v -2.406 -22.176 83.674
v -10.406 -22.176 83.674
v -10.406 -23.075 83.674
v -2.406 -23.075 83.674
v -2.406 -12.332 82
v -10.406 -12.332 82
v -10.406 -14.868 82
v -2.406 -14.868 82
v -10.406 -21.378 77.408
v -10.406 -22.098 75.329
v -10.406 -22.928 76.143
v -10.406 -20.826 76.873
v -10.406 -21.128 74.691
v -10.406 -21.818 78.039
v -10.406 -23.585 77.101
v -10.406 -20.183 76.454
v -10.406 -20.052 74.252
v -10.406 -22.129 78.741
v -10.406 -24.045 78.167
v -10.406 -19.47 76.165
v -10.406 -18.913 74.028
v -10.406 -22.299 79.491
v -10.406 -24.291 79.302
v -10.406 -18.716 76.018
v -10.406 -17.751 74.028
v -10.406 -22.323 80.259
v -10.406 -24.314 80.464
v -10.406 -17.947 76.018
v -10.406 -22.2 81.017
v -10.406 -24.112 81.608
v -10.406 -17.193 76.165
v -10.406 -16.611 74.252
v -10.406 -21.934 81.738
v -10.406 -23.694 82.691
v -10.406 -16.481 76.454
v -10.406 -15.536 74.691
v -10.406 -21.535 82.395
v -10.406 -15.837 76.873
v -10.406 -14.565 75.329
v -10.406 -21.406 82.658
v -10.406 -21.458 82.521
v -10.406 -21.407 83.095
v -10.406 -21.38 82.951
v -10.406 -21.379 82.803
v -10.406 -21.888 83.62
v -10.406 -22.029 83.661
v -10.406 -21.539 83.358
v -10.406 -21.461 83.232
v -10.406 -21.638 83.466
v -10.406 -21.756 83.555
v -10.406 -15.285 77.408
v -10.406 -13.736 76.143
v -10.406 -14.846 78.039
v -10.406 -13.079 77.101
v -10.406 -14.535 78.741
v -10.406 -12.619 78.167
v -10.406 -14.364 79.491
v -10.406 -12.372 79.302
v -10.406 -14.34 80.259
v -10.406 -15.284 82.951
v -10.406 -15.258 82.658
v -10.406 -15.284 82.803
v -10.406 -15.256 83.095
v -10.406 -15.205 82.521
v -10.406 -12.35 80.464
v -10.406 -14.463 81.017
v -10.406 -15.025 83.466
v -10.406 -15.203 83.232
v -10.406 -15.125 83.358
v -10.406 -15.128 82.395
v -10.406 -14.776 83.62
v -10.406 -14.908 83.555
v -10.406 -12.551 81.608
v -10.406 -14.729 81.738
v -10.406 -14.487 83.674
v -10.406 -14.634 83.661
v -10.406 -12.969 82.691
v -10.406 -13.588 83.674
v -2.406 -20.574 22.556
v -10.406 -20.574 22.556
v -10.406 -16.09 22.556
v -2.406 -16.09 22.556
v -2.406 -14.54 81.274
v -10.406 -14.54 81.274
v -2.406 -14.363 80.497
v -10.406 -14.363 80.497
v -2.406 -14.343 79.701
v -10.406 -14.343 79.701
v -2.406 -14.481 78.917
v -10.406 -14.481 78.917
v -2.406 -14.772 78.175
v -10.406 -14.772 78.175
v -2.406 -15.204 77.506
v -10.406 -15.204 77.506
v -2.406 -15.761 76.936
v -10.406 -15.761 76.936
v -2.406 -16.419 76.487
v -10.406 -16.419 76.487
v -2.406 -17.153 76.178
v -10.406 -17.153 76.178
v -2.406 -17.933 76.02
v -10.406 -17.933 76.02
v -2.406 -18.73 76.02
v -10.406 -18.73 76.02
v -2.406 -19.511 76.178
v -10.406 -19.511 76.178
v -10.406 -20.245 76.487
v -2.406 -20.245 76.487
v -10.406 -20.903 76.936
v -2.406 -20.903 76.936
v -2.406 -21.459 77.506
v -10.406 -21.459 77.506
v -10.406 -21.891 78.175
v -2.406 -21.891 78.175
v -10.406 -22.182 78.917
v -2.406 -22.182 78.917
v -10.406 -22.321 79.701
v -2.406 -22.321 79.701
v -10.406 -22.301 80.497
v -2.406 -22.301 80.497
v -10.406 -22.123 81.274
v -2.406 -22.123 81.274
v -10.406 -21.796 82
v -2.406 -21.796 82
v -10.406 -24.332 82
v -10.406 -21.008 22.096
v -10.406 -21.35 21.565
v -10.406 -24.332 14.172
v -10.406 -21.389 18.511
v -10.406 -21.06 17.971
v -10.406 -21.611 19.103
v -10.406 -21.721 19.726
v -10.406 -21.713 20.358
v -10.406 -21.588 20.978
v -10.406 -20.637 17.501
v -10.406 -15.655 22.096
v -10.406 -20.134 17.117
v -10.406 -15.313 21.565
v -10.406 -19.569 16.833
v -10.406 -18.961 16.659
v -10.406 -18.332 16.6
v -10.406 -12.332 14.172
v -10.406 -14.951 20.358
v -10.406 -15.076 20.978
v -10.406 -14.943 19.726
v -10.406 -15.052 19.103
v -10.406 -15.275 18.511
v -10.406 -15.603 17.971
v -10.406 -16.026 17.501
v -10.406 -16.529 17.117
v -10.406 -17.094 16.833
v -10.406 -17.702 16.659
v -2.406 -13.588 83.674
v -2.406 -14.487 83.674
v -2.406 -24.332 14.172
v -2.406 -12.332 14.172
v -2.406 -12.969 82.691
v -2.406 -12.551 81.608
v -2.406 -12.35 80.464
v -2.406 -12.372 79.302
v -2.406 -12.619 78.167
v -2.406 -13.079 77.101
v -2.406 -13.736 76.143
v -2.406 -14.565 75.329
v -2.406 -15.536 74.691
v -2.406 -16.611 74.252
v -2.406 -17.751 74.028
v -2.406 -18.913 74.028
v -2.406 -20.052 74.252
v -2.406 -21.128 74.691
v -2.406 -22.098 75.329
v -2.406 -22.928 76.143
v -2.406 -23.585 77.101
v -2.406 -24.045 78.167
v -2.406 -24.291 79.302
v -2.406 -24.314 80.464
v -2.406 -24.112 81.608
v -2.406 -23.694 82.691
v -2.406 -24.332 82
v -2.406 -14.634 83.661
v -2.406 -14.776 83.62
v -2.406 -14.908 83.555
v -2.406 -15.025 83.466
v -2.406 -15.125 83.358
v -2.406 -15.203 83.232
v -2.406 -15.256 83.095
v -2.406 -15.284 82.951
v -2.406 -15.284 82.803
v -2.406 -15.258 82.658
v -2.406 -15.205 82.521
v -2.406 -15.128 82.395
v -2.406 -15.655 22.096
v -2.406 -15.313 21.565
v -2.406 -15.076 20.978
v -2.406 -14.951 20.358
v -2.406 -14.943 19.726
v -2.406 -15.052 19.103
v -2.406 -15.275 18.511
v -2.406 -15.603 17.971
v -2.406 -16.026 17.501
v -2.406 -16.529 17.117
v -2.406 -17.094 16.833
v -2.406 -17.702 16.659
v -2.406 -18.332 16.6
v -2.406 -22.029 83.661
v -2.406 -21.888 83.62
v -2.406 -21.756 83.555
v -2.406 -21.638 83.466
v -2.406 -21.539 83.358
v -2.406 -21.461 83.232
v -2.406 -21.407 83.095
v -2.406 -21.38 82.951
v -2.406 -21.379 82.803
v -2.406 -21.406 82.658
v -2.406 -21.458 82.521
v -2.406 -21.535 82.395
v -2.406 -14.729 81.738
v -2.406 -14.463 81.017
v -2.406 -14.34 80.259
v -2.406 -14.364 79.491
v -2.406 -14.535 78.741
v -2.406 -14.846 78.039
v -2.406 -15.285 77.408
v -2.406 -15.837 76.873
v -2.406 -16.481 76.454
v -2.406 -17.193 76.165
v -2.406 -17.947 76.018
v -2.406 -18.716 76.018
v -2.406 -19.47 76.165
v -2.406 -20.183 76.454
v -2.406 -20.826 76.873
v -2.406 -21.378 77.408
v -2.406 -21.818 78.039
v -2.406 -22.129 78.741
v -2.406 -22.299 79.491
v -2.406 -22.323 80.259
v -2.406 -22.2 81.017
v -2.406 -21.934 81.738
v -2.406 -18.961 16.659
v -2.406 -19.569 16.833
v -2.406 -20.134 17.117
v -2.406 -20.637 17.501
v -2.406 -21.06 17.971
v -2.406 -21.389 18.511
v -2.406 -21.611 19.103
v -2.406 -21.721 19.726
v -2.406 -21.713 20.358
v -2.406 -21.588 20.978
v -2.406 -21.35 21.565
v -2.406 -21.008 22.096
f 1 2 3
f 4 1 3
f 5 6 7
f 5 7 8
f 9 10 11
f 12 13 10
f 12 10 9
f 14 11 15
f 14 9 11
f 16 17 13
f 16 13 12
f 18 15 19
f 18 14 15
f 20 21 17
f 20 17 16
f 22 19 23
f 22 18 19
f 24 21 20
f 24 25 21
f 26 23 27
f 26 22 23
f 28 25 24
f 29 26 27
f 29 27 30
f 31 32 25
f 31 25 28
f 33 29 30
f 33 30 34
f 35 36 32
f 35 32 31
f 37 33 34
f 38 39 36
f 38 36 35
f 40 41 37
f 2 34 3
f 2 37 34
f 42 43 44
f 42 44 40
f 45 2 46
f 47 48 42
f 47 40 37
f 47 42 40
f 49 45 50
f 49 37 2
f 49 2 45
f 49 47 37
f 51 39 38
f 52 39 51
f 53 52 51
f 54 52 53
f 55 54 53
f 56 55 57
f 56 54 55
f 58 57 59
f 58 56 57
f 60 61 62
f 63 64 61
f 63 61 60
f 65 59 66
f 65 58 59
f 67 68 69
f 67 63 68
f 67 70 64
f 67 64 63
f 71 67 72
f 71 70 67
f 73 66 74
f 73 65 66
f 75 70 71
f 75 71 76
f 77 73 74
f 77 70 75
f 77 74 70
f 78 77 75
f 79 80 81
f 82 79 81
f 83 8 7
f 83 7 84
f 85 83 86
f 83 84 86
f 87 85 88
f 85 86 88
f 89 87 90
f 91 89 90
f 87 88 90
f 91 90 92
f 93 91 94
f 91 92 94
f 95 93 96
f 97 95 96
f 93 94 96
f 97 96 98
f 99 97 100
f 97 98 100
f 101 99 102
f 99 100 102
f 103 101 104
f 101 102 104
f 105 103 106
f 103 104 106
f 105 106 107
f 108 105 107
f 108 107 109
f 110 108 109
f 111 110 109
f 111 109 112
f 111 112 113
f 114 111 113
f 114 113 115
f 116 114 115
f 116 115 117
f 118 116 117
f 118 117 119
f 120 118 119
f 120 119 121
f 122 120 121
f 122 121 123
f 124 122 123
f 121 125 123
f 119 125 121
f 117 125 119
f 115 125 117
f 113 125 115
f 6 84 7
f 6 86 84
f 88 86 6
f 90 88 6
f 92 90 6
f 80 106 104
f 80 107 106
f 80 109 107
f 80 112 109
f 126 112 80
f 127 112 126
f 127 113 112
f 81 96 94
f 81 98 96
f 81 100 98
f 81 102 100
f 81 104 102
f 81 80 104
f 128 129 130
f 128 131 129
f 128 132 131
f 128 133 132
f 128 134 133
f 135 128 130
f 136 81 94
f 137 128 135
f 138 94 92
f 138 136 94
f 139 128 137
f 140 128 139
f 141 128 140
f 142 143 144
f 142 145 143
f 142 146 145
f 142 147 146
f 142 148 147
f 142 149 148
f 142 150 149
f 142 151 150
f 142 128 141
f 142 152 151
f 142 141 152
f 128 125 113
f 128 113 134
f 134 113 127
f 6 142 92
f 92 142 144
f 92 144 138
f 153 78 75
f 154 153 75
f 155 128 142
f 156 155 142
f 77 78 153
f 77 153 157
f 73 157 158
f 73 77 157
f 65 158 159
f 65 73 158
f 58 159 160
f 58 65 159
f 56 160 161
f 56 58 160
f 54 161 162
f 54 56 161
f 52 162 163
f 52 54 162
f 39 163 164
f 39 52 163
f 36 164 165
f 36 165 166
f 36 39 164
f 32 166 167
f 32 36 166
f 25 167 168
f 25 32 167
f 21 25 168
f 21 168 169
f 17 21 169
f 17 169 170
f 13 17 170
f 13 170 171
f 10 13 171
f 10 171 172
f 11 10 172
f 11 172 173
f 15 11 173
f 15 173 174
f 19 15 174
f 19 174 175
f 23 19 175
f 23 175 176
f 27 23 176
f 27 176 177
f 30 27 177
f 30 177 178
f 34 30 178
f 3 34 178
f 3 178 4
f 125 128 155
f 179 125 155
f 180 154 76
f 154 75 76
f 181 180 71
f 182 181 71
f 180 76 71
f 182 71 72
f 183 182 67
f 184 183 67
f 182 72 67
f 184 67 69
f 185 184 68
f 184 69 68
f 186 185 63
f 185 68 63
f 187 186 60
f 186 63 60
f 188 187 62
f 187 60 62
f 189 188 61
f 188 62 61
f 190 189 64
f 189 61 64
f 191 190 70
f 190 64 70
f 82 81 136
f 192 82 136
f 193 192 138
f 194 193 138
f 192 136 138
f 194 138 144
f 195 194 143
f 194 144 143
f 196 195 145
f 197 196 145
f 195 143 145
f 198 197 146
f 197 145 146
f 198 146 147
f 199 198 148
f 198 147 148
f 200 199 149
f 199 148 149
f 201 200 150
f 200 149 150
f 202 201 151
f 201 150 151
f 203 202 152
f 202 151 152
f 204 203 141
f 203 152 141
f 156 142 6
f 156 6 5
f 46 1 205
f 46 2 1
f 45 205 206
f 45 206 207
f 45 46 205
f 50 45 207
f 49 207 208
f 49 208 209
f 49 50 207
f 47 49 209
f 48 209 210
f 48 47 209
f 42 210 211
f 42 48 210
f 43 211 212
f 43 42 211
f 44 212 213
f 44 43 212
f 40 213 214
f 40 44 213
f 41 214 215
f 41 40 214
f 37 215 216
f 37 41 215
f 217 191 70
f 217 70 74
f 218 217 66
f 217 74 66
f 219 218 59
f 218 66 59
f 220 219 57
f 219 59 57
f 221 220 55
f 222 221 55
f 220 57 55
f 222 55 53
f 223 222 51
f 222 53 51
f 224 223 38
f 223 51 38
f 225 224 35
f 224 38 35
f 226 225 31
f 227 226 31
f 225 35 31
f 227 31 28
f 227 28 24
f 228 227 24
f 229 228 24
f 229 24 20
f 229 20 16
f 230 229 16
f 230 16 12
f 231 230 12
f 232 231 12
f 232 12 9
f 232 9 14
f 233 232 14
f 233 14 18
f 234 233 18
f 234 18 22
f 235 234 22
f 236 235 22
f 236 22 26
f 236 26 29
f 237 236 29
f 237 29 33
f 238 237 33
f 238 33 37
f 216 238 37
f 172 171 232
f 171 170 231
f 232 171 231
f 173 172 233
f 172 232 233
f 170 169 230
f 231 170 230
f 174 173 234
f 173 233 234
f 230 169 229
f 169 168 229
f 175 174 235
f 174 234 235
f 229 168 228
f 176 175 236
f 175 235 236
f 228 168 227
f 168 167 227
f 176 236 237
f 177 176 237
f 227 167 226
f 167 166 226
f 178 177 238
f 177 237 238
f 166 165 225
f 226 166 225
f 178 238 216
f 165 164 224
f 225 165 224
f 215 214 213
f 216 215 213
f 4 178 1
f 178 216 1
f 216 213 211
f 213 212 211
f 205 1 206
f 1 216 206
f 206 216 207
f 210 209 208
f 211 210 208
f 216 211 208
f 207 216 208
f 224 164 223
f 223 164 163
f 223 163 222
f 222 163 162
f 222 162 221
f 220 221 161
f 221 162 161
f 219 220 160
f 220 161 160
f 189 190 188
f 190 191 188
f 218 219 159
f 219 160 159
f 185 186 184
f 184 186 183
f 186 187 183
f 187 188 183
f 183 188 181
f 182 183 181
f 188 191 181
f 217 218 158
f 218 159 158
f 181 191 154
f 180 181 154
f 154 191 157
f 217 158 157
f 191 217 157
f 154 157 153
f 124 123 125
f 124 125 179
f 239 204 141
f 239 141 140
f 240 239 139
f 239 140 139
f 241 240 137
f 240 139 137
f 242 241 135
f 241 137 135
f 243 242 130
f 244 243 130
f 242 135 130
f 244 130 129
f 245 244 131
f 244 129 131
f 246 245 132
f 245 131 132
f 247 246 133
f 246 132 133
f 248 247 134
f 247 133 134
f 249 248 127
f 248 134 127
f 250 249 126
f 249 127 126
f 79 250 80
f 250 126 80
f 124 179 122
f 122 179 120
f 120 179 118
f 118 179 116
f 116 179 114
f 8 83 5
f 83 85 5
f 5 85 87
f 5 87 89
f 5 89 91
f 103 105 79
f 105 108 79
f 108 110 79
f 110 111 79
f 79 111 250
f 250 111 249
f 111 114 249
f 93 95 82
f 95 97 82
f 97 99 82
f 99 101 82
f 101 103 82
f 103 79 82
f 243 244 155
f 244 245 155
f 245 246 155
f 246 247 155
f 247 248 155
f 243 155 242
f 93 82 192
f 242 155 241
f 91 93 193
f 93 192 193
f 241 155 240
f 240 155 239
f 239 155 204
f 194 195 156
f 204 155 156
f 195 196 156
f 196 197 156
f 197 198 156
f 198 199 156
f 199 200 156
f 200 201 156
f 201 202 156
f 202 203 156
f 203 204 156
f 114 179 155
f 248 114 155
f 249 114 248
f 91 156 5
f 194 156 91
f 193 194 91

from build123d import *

# Parameters (mm, degrees)
SKETCH_1_W          = 8
SKETCH_1_H          = 12
EXTRUDE_1_DEPTH     = 82
SKETCH_2_R          = 6
SKETCH_2_R_2        = 4
EXTRUDE_2_DEPTH     = 8
CUT_EXTRUDE_1_DEPTH = 44
CUT_EXTRUDE_2_DEPTH = 8
FILLET_2_R          = 0.8
SKETCH_5_W          = 14.17198175
SKETCH_5_H          = 12
CUT_EXTRUDE_3_DEPTH = 10


with BuildPart() as part:
    # 草图1 → 凸台-拉伸1 (new body)
    with BuildSketch(Plane.XY):
        with Locations((-6.4060213, -18.331726276)):
            Rectangle(SKETCH_1_W, SKETCH_1_H)
    extrude(amount=EXTRUDE_1_DEPTH)

    # 草图2<3> → 切除-拉伸2 (cut)
    with BuildSketch(Plane.ZY.offset(10.4060213)):
        with BuildLine():
            Line((82, -18.331726276), (82, -14.86762466))
            ThreePointArc((82, -14.86762466), (76, -18.331726276), (82, -21.795827891))
            Line((82, -21.795827891), (82, -18.331726276))
        make_face()
    extrude(amount=-CUT_EXTRUDE_2_DEPTH, mode=Mode.SUBTRACT)

    # 草图5 → 切除-拉伸3 (cut)
    with BuildSketch(Plane.ZY.offset(10.4060213)):
        with Locations((7.085990875, -18.331726276)):
            Rectangle(SKETCH_5_W, SKETCH_5_H)
        with BuildLine():
            ThreePointArc((22.555938676, -16.089589464), (18.802125111, -15.149730715), (16.6, -18.331726276))
            ThreePointArc((16.6, -18.331726276), (18.802125111, -21.513721837), (22.555938676, -20.573863088))
            Line((22.555938676, -20.573863088), (22.555938676, -16.089589464))
        make_face()
    extrude(amount=-CUT_EXTRUDE_3_DEPTH, mode=Mode.SUBTRACT)


with BuildPart() as body_2:
    # 草图2 → 凸台-拉伸2 (new body)
    with BuildSketch(Plane.ZY.offset(10.4060213)):
        with Locations((80, -18.331726276)):
            Circle(SKETCH_2_R)
        with Locations((80, -18.331726276)):
            Circle(SKETCH_2_R_2, mode=Mode.SUBTRACT)
    extrude(amount=-EXTRUDE_2_DEPTH)

    # 草图3 → 切除-拉伸1 (cut)
    with BuildSketch(Plane.ZY.offset(10.4060213)):
        Polygon((83.67416335, -12.331726276), (83.67416335, -43.507085013), (128.40681493, -43.507085013), (128.40681493, -12.331726276), (128.40681493, -1.616938917), (83.67416335, -1.616938917), align=None)
    extrude(amount=-CUT_EXTRUDE_1_DEPTH, mode=Mode.SUBTRACT)

    # 圆角2
    fillet_2_edges = [body_2.edges().sort_by_distance(p)[0] for p in [
        (-6.4060213, -19.913030697, 83.67416335),
        (-6.4060213, -16.750421854, 83.67416335),
    ]]
    fillet(fillet_2_edges, radius=FILLET_2_R)


solid = Compound([part.part, body_2.part])
